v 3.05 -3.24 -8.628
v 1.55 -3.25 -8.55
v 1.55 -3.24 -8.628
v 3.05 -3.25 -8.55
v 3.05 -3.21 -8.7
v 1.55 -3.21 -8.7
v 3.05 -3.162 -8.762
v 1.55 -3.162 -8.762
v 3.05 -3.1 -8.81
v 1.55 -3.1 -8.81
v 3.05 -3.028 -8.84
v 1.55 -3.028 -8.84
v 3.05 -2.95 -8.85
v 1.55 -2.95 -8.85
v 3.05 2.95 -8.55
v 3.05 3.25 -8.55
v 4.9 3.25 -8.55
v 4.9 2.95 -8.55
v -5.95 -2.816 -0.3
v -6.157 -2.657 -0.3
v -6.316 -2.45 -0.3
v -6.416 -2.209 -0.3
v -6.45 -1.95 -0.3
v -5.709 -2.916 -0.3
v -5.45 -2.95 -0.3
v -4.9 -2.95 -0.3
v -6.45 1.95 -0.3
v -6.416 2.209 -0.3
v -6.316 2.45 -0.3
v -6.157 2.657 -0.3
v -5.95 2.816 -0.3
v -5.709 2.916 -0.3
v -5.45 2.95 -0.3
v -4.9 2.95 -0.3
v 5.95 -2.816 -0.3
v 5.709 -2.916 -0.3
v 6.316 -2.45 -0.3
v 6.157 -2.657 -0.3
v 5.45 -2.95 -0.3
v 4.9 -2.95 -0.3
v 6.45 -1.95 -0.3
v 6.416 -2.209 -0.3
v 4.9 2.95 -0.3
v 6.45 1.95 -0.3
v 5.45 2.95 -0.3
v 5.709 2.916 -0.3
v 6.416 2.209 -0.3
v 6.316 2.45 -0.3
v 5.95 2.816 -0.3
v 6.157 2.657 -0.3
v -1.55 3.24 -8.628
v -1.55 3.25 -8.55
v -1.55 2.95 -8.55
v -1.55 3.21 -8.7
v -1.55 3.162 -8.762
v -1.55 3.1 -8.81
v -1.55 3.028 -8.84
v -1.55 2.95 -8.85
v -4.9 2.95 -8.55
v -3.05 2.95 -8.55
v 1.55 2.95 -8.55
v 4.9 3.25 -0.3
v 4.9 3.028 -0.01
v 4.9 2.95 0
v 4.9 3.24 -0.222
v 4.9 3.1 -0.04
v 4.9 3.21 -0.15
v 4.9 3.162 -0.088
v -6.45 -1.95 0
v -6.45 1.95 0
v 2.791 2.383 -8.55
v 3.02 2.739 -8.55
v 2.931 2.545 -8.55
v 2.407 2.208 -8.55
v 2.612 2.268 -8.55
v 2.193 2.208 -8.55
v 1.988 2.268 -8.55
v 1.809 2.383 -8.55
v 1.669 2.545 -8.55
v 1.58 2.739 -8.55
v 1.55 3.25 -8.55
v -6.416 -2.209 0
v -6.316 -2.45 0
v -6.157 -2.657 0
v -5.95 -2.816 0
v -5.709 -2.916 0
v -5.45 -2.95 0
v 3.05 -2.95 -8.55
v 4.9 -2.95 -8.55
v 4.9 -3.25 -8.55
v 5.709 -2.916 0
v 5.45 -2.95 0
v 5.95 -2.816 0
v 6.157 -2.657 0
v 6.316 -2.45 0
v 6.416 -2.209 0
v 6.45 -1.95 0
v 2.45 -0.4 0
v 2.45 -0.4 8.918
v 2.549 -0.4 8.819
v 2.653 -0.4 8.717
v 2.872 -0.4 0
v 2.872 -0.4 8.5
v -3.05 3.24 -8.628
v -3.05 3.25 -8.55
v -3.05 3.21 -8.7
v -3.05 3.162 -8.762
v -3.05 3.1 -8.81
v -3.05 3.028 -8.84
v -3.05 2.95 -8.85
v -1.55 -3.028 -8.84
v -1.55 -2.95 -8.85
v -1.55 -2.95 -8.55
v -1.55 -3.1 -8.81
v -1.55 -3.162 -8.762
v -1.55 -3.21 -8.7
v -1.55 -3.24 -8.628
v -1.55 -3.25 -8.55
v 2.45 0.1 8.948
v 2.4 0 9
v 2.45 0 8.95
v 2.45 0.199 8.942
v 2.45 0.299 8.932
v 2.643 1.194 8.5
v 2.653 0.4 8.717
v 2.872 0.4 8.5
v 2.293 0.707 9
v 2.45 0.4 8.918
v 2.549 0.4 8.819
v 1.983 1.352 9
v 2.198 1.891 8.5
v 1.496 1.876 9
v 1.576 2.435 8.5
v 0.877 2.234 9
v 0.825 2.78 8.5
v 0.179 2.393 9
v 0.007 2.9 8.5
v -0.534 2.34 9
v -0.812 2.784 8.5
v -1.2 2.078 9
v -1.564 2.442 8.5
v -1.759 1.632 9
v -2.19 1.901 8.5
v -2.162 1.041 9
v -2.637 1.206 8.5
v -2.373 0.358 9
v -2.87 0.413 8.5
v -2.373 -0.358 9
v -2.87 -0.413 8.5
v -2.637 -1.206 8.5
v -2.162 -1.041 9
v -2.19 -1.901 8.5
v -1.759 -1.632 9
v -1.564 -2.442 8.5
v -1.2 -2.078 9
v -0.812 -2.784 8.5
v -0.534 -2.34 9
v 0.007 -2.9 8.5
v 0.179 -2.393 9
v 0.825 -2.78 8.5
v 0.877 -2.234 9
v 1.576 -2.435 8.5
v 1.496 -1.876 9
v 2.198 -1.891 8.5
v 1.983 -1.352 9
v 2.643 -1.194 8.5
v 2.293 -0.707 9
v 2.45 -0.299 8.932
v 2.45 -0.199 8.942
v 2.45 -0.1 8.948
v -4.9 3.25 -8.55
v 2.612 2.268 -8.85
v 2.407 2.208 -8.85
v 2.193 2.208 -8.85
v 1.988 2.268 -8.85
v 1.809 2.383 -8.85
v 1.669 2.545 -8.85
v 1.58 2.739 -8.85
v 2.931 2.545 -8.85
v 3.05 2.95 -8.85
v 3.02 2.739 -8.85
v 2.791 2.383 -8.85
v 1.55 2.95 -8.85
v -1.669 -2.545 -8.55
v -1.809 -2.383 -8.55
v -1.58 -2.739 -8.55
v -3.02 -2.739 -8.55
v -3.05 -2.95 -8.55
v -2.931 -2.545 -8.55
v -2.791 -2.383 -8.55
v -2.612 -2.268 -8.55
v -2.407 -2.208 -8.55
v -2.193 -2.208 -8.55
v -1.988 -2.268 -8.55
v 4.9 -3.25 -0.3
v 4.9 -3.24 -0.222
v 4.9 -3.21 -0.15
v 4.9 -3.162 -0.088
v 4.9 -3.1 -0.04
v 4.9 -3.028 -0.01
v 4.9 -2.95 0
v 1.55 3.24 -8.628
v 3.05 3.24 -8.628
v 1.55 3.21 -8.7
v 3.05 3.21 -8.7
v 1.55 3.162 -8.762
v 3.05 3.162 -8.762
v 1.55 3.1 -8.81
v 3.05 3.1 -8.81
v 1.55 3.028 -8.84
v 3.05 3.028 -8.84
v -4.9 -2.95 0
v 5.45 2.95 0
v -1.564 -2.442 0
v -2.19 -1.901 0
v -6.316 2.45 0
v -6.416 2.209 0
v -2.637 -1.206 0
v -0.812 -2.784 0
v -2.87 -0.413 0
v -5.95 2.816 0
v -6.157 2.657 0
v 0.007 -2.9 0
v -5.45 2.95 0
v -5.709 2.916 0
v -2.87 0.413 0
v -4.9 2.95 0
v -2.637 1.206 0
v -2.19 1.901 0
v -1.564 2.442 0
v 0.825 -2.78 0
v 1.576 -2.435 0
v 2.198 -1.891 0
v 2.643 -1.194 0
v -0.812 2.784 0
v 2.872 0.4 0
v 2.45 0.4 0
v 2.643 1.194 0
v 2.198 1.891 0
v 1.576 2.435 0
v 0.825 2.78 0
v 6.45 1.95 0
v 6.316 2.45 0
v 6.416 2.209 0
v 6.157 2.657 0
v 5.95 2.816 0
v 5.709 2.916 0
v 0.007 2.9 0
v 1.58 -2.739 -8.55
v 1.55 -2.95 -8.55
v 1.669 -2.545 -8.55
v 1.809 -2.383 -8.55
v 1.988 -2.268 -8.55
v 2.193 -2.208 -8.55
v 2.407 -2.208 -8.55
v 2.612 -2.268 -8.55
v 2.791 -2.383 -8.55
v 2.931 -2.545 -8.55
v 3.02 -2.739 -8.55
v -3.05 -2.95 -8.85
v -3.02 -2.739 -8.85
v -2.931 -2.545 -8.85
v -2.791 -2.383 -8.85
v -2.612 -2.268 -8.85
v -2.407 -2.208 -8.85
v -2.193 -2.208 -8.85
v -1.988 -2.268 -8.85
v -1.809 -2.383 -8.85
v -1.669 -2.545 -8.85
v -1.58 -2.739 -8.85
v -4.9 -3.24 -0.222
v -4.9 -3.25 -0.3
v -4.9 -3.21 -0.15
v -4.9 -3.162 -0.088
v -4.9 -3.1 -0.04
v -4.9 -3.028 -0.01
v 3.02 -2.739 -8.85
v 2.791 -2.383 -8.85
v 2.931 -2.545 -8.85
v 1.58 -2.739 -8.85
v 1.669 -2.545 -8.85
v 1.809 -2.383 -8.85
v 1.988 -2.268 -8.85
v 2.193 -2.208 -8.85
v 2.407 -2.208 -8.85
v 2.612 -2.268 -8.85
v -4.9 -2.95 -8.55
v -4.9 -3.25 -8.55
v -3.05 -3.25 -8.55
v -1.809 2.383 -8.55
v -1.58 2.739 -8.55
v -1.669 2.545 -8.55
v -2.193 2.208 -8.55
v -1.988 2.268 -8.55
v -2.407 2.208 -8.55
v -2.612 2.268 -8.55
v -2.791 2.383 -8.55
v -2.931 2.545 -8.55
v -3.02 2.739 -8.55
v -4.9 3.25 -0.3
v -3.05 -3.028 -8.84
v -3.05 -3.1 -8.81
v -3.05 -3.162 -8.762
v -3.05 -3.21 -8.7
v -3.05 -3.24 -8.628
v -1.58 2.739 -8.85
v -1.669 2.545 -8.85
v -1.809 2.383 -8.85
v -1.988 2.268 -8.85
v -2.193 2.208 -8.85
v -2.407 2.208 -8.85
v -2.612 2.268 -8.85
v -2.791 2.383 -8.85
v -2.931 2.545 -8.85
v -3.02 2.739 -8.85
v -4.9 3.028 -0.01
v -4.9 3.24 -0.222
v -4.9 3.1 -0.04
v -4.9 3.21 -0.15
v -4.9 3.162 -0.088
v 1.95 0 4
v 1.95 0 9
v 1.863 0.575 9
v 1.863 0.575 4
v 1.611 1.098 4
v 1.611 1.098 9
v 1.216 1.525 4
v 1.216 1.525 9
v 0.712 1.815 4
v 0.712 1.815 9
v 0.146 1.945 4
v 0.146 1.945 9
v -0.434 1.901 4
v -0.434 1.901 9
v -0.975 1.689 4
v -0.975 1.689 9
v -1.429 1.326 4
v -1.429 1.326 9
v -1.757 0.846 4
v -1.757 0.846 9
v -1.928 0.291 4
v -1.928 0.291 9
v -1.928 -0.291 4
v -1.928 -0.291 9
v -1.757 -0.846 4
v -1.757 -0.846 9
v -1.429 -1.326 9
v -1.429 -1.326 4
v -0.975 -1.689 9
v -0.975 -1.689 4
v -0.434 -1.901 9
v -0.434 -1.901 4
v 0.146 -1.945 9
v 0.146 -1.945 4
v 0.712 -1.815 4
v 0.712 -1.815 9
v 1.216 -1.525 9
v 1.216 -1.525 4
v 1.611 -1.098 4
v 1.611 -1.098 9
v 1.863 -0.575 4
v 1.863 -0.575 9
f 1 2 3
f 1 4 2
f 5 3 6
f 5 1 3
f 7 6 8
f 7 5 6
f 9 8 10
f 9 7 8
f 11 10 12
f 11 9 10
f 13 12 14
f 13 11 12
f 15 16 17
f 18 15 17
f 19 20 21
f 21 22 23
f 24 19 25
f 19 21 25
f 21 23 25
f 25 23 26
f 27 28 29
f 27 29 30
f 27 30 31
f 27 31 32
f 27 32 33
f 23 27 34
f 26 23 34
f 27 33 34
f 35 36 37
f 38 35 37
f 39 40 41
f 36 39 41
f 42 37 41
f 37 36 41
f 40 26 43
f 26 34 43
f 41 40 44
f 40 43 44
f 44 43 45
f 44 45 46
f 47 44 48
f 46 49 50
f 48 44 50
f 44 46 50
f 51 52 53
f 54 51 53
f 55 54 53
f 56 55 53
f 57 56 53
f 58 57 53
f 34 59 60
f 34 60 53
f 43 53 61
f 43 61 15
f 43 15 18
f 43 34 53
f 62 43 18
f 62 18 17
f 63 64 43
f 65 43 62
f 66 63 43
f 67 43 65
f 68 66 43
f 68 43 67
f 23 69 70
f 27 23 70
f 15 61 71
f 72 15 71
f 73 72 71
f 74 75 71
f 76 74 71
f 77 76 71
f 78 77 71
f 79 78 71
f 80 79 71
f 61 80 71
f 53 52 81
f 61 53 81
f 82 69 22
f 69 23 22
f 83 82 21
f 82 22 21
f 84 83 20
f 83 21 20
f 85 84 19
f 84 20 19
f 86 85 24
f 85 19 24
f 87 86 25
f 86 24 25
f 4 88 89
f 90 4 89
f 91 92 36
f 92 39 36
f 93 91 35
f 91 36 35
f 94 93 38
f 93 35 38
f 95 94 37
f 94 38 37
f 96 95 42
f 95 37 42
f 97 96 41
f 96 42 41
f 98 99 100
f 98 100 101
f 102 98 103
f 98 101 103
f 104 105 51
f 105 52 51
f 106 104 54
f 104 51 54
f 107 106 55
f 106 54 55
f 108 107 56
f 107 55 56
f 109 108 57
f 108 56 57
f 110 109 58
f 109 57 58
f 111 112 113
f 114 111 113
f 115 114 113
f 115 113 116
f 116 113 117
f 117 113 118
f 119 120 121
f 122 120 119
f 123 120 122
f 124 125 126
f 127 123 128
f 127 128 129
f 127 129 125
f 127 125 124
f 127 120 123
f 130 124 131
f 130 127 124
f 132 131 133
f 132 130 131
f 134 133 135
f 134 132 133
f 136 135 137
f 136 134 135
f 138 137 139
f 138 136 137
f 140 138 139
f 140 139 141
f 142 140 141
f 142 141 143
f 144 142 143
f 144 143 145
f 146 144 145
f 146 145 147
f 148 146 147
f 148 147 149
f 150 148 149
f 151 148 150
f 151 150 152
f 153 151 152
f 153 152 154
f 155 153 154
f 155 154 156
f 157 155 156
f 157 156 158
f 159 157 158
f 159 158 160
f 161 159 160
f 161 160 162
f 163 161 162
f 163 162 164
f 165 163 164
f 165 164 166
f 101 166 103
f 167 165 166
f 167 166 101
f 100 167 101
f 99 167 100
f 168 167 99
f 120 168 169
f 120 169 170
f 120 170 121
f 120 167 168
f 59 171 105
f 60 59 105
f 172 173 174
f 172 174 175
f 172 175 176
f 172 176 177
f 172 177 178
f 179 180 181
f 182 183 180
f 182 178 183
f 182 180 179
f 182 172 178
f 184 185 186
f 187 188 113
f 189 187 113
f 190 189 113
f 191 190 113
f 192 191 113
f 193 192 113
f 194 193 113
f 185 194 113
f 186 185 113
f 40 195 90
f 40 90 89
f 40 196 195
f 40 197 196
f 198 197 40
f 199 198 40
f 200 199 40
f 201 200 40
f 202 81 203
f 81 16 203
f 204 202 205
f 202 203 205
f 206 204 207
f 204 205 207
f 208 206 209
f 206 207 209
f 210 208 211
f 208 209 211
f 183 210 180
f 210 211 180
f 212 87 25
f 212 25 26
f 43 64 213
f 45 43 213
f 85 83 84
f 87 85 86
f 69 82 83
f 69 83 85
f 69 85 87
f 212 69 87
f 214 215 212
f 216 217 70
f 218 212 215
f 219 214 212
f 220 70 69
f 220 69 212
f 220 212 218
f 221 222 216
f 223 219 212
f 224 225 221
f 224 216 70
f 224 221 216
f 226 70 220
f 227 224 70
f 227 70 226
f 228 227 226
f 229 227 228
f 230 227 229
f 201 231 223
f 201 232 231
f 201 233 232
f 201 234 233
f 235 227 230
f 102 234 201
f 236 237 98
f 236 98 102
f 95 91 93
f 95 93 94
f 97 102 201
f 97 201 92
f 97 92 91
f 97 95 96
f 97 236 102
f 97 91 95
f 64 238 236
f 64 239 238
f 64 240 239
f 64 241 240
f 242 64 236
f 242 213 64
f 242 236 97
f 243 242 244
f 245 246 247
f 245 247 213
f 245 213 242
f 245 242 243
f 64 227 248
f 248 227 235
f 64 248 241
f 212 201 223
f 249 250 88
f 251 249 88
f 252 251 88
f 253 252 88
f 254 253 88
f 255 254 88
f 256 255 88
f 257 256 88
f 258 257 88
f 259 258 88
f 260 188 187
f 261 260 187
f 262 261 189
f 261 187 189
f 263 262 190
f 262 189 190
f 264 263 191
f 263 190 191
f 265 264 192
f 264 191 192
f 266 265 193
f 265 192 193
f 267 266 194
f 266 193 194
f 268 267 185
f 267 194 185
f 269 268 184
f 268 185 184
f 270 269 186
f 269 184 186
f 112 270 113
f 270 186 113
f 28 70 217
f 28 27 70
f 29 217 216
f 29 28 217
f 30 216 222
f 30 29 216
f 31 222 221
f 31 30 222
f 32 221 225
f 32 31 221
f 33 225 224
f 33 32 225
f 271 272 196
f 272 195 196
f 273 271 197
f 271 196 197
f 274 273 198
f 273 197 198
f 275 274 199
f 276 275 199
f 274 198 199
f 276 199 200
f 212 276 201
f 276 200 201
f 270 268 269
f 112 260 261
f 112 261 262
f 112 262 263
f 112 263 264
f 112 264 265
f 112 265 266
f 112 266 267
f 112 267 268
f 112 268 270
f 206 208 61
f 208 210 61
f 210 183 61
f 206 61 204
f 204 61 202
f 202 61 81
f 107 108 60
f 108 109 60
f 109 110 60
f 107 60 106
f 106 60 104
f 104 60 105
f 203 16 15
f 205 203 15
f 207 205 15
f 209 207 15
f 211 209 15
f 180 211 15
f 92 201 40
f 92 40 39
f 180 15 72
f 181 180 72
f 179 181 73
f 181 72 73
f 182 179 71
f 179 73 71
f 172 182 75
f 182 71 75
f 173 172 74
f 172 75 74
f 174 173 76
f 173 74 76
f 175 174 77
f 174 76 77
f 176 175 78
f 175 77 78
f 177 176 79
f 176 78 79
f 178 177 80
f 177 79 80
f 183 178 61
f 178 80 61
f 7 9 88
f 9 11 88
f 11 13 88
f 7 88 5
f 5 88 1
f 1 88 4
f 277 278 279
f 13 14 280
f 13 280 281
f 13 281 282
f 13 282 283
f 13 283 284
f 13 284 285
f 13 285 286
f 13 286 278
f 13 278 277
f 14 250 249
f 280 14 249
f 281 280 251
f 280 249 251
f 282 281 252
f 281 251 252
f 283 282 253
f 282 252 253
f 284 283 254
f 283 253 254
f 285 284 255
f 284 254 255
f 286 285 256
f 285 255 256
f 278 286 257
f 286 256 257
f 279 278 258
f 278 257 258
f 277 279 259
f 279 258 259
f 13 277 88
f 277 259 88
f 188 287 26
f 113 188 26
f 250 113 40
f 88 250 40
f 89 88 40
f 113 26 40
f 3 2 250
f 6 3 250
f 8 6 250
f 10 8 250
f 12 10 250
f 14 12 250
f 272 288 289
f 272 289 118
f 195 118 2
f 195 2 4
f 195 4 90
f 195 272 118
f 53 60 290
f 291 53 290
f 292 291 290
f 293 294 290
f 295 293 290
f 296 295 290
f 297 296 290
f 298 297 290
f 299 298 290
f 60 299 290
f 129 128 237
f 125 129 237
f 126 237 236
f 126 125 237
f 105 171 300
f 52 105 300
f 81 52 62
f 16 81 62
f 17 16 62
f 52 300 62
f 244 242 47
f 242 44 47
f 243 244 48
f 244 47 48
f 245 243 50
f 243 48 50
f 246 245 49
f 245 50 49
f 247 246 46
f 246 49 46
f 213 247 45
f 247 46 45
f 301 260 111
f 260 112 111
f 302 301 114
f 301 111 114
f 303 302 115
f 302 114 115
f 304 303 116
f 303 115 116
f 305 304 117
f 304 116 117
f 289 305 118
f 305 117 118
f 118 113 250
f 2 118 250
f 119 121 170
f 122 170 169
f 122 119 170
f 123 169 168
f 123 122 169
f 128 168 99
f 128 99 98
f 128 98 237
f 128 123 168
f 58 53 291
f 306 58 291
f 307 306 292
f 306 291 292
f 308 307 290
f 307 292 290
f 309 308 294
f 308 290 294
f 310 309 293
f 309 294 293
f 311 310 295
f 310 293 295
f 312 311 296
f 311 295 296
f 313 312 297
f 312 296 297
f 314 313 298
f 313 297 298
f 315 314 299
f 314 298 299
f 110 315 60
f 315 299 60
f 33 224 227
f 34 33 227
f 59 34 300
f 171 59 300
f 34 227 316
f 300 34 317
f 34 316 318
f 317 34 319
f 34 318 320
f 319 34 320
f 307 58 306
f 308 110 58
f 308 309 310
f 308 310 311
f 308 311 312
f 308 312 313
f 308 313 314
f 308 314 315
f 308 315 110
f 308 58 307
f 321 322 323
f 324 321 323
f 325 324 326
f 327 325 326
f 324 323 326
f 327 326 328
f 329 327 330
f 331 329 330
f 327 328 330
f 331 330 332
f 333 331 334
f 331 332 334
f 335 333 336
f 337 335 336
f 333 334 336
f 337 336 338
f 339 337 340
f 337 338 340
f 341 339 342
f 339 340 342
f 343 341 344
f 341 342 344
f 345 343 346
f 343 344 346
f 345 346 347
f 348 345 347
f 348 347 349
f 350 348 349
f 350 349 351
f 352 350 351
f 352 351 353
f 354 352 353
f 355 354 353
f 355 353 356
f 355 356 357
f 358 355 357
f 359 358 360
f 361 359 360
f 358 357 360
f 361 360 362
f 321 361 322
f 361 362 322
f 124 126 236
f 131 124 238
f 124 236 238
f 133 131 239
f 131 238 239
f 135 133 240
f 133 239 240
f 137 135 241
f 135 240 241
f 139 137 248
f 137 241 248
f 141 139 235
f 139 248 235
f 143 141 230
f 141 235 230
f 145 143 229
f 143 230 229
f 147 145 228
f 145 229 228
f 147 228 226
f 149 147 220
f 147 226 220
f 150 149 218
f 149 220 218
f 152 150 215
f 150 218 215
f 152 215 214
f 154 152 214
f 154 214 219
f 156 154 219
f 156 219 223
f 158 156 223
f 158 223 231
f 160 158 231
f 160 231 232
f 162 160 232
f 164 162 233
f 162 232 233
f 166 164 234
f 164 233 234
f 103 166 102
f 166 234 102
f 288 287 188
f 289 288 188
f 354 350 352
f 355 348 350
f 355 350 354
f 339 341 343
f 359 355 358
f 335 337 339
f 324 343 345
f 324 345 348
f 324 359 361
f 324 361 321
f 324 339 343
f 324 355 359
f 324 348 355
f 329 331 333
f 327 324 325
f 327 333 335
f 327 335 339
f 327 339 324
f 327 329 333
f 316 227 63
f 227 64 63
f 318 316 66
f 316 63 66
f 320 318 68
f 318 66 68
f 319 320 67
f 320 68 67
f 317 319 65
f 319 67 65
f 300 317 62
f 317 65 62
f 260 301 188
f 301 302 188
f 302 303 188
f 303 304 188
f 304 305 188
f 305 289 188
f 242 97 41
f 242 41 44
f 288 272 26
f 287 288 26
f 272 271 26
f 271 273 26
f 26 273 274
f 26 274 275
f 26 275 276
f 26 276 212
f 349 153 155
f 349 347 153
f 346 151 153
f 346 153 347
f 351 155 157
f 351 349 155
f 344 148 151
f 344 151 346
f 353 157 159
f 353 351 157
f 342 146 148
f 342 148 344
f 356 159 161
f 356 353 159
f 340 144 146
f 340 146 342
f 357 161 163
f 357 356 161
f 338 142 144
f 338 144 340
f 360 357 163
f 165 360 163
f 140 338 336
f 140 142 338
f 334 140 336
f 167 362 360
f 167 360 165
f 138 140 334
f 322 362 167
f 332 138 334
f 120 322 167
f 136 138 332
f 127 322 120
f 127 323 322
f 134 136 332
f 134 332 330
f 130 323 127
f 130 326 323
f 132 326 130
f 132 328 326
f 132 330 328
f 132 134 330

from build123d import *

# Parameters (mm, degrees)
SKETCH005_W     = 12.9
SKETCH005_H     = 5.9
PAD003_DEPTH    = 0.3
FILLET003_R     = 1
SKETCH006_W     = 9.8
SKETCH006_H     = 0.3
PAD004_DEPTH    = 8.55
PAD005_DEPTH    = 0.3
FILLET004_R     = 0.3
SKETCH008_R     = 2.9
PAD006_DEPTH    = 9
SKETCH009_R     = 1.95
POCKET002_DEPTH = 5
CHAMFER_SIZE    = 0.5
SKETCH010_W     = 0.5
SKETCH010_H     = 0.8
POCKET003_DEPTH = 9


with BuildPart() as part:
    # Sketch005 → Pad003 (new body)
    with BuildSketch(Plane.XY):
        Rectangle(SKETCH005_W, SKETCH005_H)
    extrude(amount=-PAD003_DEPTH)

    # Fillet003
    fillet003_edges = [part.edges().sort_by_distance(p)[0] for p in [
        (-6.45, -2.95, -0.15),
        (-6.45, 2.95, -0.15),
        (6.45, 2.95, -0.15),
        (6.45, -2.95, -0.15),
    ]]
    fillet(fillet003_edges, radius=FILLET003_R)

    # Sketch006 (on Face2 of Fillet003) → Pad004 (join)
    with BuildSketch(Plane.XY):
        with Locations((0, 3.1)):
            Rectangle(SKETCH006_W, SKETCH006_H)
        with Locations((0, -3.1)):
            Rectangle(SKETCH006_W, SKETCH006_H)
    extrude(amount=-PAD004_DEPTH)

    # Sketch007 (on Face21 of Pad004) → Pad005 (join)
    with BuildSketch(Plane(origin=(0, 0, -8.55), x_dir=(1, 0, 0), z_dir=(0, 0, -1))):
        with BuildLine():
            ThreePointArc((-3.05, 2.95), (-2.3, 2.2), (-1.55, 2.95))
            Line((-1.55, 2.95), (-1.55, 3.25))
            Line((-3.05, 3.25), (-1.55, 3.25))
            Line((-3.05, 3.25), (-3.05, 2.95))
        make_face()
        with BuildLine():
            ThreePointArc((1.55, 2.95), (2.3, 2.2), (3.05, 2.95))
            Line((3.05, 2.95), (3.05, 3.25))
            Line((1.55, 3.25), (3.05, 3.25))
            Line((1.55, 3.25), (1.55, 2.95))
        make_face()
        with BuildLine():
            ThreePointArc((-1.55, -2.95), (-2.3, -2.2), (-3.05, -2.95))
            Line((-3.05, -2.95), (-3.05, -3.25))
            Line((-3.05, -3.25), (-1.55, -3.25))
            Line((-1.55, -3.25), (-1.55, -2.95))
        make_face()
        with BuildLine():
            ThreePointArc((3.05, -2.95), (2.3, -2.2), (1.55, -2.95))
            Line((1.55, -2.95), (1.55, -3.25))
            Line((1.55, -3.25), (3.05, -3.25))
            Line((3.05, -3.25), (3.05, -2.95))
        make_face()
    extrude(amount=PAD005_DEPTH)

    # Fillet004
    fillet004_edges = [part.edges().sort_by_distance(p)[0] for p in [
        (-2.3, -3.25, -8.85),
        (2.3, -3.25, -8.85),
        (2.3, 3.25, -8.85),
        (-2.3, 3.25, -8.85),
        (0, 3.25, 0),
        (0, -3.25, 0),
    ]]
    fillet(fillet004_edges, radius=FILLET004_R)

    # Sketch008 (on Face1 of Fillet004) → Pad006 (join)
    with BuildSketch(Plane.XY):
        Circle(SKETCH008_R)
    extrude(amount=PAD006_DEPTH)

    # Sketch009 (on Face22 of Pad006) → Pocket002 (cut)
    with BuildSketch(Plane.XY.offset(9)):
        Circle(SKETCH009_R)
    extrude(amount=-POCKET002_DEPTH, mode=Mode.SUBTRACT)

    # Chamfer
    chamfer_edges = [part.edges().sort_by_distance(p)[0] for p in [
        (-2.9, 0, 9),
    ]]
    chamfer(chamfer_edges, length=CHAMFER_SIZE)

    # Sketch010 (on Face4 of Chamfer) → Pocket003 (cut)
    with BuildSketch(Plane.XY.offset(9)):
        with Locations((2.7, 0)):
            Rectangle(SKETCH010_W, SKETCH010_H)
    extrude(amount=-POCKET003_DEPTH, mode=Mode.SUBTRACT)


solid = part.part
